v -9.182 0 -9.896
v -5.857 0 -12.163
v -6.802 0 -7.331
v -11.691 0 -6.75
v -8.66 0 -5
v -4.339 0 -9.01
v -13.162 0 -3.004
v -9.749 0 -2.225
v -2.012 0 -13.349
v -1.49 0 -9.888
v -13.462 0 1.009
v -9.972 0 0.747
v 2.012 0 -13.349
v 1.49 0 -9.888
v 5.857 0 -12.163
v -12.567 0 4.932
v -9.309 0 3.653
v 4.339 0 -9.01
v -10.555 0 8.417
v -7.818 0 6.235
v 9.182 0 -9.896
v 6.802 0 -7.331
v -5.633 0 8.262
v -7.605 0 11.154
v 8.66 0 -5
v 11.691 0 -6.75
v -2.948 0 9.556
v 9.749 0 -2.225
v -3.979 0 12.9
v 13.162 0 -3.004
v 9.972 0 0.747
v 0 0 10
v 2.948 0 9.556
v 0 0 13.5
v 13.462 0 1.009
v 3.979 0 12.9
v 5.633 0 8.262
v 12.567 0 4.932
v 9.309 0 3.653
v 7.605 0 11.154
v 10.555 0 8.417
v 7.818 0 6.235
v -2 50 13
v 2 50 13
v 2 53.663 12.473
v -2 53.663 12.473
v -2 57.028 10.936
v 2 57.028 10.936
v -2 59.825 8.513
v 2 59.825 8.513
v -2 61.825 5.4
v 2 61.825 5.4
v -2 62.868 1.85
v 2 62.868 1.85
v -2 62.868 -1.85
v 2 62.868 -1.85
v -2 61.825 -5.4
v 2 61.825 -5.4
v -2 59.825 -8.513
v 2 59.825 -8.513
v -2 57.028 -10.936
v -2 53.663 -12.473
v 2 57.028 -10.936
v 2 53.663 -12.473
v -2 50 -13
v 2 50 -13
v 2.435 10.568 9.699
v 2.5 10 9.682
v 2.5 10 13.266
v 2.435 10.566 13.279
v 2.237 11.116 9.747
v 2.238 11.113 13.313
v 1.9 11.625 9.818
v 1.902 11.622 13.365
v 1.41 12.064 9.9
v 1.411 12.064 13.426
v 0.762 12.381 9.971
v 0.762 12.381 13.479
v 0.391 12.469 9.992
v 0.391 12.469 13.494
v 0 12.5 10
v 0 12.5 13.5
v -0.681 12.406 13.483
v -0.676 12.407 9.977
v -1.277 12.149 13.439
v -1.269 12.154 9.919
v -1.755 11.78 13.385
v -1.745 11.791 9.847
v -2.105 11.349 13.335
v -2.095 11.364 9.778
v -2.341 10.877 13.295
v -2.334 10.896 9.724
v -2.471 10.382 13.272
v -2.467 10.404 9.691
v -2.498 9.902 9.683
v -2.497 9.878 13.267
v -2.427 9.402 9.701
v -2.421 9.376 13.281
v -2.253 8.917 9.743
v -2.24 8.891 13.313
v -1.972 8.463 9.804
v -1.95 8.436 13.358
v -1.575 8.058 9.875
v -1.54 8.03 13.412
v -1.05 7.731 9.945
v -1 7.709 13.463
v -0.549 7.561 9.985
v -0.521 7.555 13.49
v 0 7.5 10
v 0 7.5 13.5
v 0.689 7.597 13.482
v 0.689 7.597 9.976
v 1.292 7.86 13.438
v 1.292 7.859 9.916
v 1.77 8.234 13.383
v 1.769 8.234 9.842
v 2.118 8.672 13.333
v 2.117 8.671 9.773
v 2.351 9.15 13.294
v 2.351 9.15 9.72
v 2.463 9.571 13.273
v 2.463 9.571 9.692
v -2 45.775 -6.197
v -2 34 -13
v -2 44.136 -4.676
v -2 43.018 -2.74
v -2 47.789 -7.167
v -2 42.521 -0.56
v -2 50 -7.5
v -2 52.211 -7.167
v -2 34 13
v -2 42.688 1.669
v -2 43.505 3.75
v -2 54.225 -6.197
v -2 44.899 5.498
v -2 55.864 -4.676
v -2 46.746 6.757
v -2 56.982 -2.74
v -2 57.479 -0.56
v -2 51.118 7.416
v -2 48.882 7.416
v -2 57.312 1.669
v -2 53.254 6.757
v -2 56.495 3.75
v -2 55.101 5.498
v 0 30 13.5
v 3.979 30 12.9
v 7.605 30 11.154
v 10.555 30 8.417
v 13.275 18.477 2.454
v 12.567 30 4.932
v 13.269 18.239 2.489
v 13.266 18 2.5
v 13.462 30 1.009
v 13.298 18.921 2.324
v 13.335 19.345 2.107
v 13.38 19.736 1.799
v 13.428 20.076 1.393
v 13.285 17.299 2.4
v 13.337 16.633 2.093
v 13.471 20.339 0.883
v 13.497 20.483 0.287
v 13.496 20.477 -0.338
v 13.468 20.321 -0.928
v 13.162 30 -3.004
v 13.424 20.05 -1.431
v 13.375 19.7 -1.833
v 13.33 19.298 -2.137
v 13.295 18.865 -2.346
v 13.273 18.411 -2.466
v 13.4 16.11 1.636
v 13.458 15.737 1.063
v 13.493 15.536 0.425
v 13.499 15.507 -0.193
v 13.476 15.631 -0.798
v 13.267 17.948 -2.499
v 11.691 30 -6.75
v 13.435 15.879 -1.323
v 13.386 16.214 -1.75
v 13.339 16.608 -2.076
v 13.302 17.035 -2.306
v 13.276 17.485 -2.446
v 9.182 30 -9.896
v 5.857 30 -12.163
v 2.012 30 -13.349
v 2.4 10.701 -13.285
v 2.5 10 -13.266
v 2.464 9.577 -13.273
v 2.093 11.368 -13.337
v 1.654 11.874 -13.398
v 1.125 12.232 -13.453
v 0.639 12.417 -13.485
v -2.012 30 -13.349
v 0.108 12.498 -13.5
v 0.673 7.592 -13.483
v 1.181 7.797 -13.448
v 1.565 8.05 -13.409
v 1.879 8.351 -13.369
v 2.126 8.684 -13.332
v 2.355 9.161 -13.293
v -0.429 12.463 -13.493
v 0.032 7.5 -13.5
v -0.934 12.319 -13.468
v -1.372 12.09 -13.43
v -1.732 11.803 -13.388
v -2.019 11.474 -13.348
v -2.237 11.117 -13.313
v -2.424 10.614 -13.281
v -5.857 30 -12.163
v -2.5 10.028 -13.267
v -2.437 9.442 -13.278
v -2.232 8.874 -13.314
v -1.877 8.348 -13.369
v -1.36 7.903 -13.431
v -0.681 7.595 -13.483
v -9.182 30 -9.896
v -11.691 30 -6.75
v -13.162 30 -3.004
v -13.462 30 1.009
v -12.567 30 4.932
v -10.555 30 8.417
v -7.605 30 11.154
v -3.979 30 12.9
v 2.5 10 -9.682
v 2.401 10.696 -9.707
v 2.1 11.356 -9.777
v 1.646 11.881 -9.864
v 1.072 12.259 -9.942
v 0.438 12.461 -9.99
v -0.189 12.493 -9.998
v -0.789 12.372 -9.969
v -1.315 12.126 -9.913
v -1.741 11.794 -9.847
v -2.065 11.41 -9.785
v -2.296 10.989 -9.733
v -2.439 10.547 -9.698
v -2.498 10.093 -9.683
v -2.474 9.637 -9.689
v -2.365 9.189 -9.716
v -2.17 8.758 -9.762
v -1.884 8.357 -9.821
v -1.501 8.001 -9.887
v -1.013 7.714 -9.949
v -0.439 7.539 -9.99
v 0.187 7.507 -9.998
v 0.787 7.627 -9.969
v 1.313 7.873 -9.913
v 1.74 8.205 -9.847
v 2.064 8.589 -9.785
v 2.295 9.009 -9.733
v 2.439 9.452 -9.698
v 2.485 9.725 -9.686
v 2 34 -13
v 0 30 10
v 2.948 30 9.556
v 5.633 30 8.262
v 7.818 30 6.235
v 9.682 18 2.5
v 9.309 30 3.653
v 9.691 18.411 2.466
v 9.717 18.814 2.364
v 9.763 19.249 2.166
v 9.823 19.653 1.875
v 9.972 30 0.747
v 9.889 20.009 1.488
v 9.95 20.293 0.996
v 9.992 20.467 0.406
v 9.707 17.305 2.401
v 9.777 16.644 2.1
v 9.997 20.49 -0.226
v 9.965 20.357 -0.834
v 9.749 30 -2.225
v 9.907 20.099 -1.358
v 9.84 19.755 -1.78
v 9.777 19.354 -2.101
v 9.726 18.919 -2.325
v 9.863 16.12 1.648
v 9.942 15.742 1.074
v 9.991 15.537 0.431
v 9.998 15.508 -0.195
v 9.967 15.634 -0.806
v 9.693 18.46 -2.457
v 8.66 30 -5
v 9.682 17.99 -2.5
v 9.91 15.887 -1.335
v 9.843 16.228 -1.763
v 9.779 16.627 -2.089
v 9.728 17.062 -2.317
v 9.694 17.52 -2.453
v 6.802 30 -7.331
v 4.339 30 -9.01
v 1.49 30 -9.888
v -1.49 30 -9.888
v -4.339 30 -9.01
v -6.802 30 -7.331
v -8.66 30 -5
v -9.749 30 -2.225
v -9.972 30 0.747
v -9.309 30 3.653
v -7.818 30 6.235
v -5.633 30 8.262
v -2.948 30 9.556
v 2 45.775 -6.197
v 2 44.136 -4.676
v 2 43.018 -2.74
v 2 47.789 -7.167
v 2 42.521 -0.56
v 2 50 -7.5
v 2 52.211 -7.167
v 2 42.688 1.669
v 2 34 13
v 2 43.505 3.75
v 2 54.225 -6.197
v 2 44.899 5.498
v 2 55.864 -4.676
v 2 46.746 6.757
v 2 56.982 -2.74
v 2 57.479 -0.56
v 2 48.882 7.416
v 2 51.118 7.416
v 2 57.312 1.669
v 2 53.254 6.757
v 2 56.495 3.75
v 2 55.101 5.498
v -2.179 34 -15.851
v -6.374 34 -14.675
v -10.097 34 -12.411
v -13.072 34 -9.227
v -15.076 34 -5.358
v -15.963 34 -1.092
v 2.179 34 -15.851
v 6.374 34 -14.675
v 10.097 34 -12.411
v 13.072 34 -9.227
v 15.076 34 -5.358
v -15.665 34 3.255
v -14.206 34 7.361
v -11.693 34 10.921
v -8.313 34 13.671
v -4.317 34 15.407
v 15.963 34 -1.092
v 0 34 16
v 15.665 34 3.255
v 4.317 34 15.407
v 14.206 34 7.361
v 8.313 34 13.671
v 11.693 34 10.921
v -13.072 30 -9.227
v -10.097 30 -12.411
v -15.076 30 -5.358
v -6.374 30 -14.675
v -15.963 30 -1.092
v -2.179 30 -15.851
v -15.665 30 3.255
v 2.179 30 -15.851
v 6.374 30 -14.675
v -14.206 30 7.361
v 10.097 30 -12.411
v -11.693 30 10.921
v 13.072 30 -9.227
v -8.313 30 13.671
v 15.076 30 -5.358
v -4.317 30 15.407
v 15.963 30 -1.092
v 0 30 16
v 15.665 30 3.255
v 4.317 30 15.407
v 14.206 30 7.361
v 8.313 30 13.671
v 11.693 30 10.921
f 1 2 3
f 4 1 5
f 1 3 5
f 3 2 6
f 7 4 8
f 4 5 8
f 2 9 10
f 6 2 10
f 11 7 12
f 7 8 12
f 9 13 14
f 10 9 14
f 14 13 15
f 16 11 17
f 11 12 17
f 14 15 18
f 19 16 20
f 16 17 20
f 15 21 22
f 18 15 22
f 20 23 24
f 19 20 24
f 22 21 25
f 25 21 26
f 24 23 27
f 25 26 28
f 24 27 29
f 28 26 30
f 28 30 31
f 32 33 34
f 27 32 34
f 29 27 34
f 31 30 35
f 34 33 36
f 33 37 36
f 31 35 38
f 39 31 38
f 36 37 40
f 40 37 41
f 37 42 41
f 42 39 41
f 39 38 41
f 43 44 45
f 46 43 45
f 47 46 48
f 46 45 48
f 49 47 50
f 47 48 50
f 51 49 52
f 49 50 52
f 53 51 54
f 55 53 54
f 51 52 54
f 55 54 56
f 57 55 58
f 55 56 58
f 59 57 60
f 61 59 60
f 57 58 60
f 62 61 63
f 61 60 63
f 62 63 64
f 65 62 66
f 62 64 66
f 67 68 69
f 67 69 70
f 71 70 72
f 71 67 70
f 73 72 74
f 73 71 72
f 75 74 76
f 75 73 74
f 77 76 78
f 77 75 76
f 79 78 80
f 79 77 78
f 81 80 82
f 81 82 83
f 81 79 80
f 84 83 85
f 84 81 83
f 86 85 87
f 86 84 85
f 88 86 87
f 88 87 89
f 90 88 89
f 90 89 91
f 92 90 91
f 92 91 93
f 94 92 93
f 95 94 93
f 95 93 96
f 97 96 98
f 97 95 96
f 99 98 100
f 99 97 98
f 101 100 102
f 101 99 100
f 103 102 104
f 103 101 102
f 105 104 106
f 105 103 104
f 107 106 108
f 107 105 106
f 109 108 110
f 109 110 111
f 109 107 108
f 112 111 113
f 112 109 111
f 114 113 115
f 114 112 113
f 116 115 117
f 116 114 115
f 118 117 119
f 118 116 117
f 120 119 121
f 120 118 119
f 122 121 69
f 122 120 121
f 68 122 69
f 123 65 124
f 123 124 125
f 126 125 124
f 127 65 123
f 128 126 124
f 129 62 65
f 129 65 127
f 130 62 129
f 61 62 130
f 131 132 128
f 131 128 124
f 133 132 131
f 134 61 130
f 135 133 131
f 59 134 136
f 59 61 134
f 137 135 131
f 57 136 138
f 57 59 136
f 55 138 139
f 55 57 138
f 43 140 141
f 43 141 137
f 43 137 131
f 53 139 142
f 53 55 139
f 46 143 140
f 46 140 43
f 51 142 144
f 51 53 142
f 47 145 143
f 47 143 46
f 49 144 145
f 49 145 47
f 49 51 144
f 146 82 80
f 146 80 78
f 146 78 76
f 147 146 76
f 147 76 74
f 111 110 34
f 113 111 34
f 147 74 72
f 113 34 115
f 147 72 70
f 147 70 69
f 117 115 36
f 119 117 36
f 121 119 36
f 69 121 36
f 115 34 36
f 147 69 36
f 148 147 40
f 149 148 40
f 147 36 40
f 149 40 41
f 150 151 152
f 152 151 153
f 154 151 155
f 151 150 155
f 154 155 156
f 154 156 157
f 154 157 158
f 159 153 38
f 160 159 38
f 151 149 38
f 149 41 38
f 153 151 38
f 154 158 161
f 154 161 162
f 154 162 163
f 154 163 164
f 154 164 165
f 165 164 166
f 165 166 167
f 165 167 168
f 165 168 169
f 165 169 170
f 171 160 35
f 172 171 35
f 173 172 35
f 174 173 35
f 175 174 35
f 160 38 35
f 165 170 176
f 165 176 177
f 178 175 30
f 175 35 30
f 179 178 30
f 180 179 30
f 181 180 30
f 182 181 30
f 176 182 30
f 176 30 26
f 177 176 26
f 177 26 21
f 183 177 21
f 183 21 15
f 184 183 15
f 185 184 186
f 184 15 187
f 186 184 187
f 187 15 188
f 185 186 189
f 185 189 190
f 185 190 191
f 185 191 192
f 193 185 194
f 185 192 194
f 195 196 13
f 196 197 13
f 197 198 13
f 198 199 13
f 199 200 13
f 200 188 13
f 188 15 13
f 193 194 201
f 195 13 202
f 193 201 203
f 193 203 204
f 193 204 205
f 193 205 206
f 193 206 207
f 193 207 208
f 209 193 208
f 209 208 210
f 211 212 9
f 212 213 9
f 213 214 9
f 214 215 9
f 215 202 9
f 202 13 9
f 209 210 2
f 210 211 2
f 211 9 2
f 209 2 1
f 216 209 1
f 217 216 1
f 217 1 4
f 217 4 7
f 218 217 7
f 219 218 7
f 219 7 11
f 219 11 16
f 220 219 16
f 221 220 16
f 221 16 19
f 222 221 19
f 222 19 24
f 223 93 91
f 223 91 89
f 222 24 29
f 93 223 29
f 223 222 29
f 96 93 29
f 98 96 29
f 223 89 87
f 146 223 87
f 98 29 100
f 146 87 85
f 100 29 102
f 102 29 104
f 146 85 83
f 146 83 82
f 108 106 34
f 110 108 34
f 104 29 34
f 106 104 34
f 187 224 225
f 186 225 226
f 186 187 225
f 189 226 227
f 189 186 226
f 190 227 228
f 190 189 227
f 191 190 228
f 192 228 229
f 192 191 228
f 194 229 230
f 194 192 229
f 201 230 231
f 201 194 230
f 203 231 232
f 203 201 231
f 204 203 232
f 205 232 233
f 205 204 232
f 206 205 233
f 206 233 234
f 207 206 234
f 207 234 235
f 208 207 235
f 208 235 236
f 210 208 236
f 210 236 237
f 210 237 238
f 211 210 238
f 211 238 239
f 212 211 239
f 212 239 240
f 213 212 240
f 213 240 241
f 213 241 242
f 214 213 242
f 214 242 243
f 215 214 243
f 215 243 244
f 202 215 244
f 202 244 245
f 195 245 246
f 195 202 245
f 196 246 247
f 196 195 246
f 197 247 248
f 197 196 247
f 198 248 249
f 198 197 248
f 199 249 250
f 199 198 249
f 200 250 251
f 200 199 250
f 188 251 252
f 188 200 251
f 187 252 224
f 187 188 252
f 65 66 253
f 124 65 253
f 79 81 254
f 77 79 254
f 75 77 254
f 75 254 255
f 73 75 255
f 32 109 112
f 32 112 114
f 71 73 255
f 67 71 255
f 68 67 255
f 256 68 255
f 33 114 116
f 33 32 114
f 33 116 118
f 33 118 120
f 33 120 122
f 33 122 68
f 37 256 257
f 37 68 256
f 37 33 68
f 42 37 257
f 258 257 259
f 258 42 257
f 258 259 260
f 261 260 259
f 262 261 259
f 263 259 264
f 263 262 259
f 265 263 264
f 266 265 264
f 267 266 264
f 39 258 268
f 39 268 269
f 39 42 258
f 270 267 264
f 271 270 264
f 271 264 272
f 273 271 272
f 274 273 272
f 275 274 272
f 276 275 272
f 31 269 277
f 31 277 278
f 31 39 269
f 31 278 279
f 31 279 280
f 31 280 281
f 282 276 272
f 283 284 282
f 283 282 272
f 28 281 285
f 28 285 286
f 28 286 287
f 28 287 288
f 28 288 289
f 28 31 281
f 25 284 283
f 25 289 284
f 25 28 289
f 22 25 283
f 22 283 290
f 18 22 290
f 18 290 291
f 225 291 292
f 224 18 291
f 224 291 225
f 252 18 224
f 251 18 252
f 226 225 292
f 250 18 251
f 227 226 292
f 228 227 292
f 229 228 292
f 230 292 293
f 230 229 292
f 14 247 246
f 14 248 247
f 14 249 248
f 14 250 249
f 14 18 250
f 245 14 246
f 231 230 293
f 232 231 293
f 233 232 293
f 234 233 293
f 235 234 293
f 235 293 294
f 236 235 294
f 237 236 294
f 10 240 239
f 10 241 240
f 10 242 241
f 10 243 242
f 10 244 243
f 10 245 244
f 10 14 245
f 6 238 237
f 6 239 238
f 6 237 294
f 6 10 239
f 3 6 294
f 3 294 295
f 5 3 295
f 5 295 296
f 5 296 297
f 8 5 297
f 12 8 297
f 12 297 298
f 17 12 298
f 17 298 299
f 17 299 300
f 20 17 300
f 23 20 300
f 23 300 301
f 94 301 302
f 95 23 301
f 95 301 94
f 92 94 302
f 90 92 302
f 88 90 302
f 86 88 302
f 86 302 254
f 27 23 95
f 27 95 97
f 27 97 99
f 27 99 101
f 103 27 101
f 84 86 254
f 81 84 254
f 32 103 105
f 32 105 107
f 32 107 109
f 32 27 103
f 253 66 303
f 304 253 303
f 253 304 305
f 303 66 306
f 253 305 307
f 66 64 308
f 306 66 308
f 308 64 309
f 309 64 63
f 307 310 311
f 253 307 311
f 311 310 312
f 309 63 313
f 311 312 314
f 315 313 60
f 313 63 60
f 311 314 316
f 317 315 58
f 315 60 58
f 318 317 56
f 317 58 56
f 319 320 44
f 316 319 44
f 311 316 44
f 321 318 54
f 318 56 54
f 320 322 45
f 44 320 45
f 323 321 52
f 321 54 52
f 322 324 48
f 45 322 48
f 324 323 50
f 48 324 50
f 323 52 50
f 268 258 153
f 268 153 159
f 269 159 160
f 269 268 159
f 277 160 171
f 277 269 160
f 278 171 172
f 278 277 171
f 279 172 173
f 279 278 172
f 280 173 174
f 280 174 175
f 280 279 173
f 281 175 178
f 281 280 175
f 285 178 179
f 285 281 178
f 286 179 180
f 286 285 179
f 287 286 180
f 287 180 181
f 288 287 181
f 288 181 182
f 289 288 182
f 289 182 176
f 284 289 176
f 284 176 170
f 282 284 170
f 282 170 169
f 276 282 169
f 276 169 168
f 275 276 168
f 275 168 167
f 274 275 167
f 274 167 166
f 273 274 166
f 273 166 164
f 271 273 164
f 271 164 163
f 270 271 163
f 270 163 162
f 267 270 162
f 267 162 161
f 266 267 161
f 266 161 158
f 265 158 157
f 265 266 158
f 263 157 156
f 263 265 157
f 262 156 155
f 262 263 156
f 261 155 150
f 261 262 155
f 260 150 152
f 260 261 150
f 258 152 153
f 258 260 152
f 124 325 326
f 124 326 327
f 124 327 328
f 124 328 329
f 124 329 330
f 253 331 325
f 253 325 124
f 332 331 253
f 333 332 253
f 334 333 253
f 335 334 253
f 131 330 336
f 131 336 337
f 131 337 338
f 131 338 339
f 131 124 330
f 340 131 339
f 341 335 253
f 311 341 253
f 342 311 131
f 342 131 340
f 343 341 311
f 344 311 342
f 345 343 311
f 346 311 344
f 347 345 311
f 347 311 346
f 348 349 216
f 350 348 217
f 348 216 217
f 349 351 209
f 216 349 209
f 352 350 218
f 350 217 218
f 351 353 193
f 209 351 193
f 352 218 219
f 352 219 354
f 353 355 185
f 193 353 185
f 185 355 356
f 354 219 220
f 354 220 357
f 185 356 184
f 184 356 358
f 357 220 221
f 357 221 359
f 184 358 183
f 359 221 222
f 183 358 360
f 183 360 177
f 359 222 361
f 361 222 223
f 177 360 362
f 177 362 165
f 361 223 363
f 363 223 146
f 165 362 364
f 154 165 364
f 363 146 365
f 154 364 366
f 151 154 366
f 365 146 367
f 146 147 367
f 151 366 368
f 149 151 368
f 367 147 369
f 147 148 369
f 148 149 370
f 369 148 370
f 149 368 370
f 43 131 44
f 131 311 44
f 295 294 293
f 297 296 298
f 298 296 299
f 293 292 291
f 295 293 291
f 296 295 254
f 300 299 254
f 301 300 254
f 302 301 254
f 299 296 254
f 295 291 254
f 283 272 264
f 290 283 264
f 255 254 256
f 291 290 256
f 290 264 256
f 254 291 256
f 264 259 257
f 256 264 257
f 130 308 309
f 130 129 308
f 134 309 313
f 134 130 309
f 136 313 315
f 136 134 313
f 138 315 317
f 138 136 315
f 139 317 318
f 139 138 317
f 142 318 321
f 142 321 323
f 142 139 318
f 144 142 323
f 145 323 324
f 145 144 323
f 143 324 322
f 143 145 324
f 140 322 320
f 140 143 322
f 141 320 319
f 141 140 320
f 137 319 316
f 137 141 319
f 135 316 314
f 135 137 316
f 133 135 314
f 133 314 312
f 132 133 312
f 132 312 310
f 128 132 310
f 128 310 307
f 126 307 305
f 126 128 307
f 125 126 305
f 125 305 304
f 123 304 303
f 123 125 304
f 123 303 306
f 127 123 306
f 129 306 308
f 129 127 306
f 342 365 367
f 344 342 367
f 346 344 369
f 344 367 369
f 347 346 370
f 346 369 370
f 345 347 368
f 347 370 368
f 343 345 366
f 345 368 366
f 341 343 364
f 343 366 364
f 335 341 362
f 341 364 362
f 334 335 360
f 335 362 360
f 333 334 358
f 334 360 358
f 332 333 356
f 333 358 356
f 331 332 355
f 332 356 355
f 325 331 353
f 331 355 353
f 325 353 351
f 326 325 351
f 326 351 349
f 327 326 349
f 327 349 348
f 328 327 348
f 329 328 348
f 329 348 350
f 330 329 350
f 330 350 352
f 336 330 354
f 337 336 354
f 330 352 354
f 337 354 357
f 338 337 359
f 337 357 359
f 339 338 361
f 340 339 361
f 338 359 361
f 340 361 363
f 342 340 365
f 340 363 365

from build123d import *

# Parameters (mm, degrees)
SKETCH1_R               = 13.5
SKETCH1_R_2             = 10
BOSS_EXTRUDE1_DEPTH     = 30
BOSS_EXTRUDE2_START     = 30
SKETCH1_3_R             = 16
SKETCH1_3_R_2           = 13.5
SKETCH1_3_R_3           = 10
BOSS_EXTRUDE2_DEPTH     = 4
SKETCH2_R               = 7.5
BOSS_EXTRUDE3_DEPTH     = 2
CUT_EXTRUDE1_REACH      = 68.94
CUT_EXTRUDE1_END_RADIUS = 13.5
SKETCH2_3_R             = 2.5
CUT_EXTRUDE2_DEPTH      = 67.940271885
CUT_EXTRUDE2_DEPTH_BACK = 67.940271885
SKETCH3_R               = 2.5


with BuildPart() as part:
    # Sketch1 → Boss-Extrude1 (new body)
    with BuildSketch(Plane(origin=(0, 0, 0), x_dir=(1, 0, 0), z_dir=(0, 1, 0))):
        with Locations(Location((0, 0, 0), (0, 0, 270))):
            Circle(SKETCH1_R)
        with Locations(Location((0, 0, 0), (0, 0, 270))):
            Circle(SKETCH1_R_2, mode=Mode.SUBTRACT)
    extrude(amount=BOSS_EXTRUDE1_DEPTH)

    # Sketch1<3> → Boss-Extrude2 (add)
    # profile 1 of 3: a face of its own
    with BuildSketch(Plane(origin=(0, 0, 0), x_dir=(1, 0, 0), z_dir=(0, 1, 0)).offset(BOSS_EXTRUDE2_START)):
        with Locations(Location((0, 0, 0), (0, 0, 270))):
            Circle(SKETCH1_3_R)
        with Locations(Location((0, 0, 0), (0, 0, 270))):
            Circle(SKETCH1_3_R_2, mode=Mode.SUBTRACT)
    # profile 2 of 3: a face of its own
    with BuildSketch(Plane(origin=(0, 0, 0), x_dir=(1, 0, 0), z_dir=(0, 1, 0)).offset(BOSS_EXTRUDE2_START)):
        with Locations(Location((0, 0, 0), (0, 0, 270))):
            Circle(SKETCH1_3_R_2)
        with Locations(Location((0, 0, 0), (0, 0, 270))):
            Circle(SKETCH1_3_R_3, mode=Mode.SUBTRACT)
    # profile 3 of 3: a face of its own
    with BuildSketch(Plane(origin=(0, 0, 0), x_dir=(1, 0, 0), z_dir=(0, 1, 0)).offset(BOSS_EXTRUDE2_START)):
        with Locations(Location((0, 0, 0), (0, 0, 270))):
            Circle(SKETCH1_3_R_3)
    extrude(amount=BOSS_EXTRUDE2_DEPTH)

    # Sketch2 → Boss-Extrude3 (add, symmetric)
    with BuildSketch(Plane(origin=(0, 0, 0), x_dir=(0, 0, -1), z_dir=(1, 0, 0))):
        with BuildLine():
            Line((13, 50), (13, 34))
            Line((13, 34), (-13, 34))
            Line((-13, 34), (-13, 50))
            ThreePointArc((-13, 50), (0, 63), (13, 50))
        make_face()
        with Locations((0, 50)):
            Circle(SKETCH2_R, mode=Mode.SUBTRACT)
    extrude(amount=BOSS_EXTRUDE3_DEPTH, both=True)

    # Cut-Extrude1: up to this cylinder (the profile starts inside it)
    cut_extrude1_end = Plane(origin=(0, 18, 0), z_dir=(0, -1, 0)) * Cylinder(CUT_EXTRUDE1_END_RADIUS, 165.88, mode=Mode.PRIVATE)
    # Sketch2<3> → Cut-Extrude1 (cut, up to the surface)
    with BuildSketch(Plane(origin=(0, 0, 0), x_dir=(0, 0, -1), z_dir=(1, 0, 0)), mode=Mode.PRIVATE) as cut_extrude1_sk1:
        with Locations(Location((0, 18, 0), (0, 0, 180))):
            Circle(SKETCH2_3_R)
    cut_extrude1_tool1 = extrude(cut_extrude1_sk1.sketch, amount=CUT_EXTRUDE1_REACH, mode=Mode.PRIVATE) & cut_extrude1_end
    add(cut_extrude1_tool1.solids().sort_by_distance((0, 18, 0))[0], mode=Mode.SUBTRACT)

    # Sketch3 → Cut-Extrude2 (cut, two sides: drawn at the far end of the back side and taken through both)
    with BuildSketch(Plane.XY.offset(-CUT_EXTRUDE2_DEPTH_BACK)):
        with Locations((0, 10)):
            Circle(SKETCH3_R)
    extrude(amount=CUT_EXTRUDE2_DEPTH + CUT_EXTRUDE2_DEPTH_BACK, mode=Mode.SUBTRACT)


solid = part.part
